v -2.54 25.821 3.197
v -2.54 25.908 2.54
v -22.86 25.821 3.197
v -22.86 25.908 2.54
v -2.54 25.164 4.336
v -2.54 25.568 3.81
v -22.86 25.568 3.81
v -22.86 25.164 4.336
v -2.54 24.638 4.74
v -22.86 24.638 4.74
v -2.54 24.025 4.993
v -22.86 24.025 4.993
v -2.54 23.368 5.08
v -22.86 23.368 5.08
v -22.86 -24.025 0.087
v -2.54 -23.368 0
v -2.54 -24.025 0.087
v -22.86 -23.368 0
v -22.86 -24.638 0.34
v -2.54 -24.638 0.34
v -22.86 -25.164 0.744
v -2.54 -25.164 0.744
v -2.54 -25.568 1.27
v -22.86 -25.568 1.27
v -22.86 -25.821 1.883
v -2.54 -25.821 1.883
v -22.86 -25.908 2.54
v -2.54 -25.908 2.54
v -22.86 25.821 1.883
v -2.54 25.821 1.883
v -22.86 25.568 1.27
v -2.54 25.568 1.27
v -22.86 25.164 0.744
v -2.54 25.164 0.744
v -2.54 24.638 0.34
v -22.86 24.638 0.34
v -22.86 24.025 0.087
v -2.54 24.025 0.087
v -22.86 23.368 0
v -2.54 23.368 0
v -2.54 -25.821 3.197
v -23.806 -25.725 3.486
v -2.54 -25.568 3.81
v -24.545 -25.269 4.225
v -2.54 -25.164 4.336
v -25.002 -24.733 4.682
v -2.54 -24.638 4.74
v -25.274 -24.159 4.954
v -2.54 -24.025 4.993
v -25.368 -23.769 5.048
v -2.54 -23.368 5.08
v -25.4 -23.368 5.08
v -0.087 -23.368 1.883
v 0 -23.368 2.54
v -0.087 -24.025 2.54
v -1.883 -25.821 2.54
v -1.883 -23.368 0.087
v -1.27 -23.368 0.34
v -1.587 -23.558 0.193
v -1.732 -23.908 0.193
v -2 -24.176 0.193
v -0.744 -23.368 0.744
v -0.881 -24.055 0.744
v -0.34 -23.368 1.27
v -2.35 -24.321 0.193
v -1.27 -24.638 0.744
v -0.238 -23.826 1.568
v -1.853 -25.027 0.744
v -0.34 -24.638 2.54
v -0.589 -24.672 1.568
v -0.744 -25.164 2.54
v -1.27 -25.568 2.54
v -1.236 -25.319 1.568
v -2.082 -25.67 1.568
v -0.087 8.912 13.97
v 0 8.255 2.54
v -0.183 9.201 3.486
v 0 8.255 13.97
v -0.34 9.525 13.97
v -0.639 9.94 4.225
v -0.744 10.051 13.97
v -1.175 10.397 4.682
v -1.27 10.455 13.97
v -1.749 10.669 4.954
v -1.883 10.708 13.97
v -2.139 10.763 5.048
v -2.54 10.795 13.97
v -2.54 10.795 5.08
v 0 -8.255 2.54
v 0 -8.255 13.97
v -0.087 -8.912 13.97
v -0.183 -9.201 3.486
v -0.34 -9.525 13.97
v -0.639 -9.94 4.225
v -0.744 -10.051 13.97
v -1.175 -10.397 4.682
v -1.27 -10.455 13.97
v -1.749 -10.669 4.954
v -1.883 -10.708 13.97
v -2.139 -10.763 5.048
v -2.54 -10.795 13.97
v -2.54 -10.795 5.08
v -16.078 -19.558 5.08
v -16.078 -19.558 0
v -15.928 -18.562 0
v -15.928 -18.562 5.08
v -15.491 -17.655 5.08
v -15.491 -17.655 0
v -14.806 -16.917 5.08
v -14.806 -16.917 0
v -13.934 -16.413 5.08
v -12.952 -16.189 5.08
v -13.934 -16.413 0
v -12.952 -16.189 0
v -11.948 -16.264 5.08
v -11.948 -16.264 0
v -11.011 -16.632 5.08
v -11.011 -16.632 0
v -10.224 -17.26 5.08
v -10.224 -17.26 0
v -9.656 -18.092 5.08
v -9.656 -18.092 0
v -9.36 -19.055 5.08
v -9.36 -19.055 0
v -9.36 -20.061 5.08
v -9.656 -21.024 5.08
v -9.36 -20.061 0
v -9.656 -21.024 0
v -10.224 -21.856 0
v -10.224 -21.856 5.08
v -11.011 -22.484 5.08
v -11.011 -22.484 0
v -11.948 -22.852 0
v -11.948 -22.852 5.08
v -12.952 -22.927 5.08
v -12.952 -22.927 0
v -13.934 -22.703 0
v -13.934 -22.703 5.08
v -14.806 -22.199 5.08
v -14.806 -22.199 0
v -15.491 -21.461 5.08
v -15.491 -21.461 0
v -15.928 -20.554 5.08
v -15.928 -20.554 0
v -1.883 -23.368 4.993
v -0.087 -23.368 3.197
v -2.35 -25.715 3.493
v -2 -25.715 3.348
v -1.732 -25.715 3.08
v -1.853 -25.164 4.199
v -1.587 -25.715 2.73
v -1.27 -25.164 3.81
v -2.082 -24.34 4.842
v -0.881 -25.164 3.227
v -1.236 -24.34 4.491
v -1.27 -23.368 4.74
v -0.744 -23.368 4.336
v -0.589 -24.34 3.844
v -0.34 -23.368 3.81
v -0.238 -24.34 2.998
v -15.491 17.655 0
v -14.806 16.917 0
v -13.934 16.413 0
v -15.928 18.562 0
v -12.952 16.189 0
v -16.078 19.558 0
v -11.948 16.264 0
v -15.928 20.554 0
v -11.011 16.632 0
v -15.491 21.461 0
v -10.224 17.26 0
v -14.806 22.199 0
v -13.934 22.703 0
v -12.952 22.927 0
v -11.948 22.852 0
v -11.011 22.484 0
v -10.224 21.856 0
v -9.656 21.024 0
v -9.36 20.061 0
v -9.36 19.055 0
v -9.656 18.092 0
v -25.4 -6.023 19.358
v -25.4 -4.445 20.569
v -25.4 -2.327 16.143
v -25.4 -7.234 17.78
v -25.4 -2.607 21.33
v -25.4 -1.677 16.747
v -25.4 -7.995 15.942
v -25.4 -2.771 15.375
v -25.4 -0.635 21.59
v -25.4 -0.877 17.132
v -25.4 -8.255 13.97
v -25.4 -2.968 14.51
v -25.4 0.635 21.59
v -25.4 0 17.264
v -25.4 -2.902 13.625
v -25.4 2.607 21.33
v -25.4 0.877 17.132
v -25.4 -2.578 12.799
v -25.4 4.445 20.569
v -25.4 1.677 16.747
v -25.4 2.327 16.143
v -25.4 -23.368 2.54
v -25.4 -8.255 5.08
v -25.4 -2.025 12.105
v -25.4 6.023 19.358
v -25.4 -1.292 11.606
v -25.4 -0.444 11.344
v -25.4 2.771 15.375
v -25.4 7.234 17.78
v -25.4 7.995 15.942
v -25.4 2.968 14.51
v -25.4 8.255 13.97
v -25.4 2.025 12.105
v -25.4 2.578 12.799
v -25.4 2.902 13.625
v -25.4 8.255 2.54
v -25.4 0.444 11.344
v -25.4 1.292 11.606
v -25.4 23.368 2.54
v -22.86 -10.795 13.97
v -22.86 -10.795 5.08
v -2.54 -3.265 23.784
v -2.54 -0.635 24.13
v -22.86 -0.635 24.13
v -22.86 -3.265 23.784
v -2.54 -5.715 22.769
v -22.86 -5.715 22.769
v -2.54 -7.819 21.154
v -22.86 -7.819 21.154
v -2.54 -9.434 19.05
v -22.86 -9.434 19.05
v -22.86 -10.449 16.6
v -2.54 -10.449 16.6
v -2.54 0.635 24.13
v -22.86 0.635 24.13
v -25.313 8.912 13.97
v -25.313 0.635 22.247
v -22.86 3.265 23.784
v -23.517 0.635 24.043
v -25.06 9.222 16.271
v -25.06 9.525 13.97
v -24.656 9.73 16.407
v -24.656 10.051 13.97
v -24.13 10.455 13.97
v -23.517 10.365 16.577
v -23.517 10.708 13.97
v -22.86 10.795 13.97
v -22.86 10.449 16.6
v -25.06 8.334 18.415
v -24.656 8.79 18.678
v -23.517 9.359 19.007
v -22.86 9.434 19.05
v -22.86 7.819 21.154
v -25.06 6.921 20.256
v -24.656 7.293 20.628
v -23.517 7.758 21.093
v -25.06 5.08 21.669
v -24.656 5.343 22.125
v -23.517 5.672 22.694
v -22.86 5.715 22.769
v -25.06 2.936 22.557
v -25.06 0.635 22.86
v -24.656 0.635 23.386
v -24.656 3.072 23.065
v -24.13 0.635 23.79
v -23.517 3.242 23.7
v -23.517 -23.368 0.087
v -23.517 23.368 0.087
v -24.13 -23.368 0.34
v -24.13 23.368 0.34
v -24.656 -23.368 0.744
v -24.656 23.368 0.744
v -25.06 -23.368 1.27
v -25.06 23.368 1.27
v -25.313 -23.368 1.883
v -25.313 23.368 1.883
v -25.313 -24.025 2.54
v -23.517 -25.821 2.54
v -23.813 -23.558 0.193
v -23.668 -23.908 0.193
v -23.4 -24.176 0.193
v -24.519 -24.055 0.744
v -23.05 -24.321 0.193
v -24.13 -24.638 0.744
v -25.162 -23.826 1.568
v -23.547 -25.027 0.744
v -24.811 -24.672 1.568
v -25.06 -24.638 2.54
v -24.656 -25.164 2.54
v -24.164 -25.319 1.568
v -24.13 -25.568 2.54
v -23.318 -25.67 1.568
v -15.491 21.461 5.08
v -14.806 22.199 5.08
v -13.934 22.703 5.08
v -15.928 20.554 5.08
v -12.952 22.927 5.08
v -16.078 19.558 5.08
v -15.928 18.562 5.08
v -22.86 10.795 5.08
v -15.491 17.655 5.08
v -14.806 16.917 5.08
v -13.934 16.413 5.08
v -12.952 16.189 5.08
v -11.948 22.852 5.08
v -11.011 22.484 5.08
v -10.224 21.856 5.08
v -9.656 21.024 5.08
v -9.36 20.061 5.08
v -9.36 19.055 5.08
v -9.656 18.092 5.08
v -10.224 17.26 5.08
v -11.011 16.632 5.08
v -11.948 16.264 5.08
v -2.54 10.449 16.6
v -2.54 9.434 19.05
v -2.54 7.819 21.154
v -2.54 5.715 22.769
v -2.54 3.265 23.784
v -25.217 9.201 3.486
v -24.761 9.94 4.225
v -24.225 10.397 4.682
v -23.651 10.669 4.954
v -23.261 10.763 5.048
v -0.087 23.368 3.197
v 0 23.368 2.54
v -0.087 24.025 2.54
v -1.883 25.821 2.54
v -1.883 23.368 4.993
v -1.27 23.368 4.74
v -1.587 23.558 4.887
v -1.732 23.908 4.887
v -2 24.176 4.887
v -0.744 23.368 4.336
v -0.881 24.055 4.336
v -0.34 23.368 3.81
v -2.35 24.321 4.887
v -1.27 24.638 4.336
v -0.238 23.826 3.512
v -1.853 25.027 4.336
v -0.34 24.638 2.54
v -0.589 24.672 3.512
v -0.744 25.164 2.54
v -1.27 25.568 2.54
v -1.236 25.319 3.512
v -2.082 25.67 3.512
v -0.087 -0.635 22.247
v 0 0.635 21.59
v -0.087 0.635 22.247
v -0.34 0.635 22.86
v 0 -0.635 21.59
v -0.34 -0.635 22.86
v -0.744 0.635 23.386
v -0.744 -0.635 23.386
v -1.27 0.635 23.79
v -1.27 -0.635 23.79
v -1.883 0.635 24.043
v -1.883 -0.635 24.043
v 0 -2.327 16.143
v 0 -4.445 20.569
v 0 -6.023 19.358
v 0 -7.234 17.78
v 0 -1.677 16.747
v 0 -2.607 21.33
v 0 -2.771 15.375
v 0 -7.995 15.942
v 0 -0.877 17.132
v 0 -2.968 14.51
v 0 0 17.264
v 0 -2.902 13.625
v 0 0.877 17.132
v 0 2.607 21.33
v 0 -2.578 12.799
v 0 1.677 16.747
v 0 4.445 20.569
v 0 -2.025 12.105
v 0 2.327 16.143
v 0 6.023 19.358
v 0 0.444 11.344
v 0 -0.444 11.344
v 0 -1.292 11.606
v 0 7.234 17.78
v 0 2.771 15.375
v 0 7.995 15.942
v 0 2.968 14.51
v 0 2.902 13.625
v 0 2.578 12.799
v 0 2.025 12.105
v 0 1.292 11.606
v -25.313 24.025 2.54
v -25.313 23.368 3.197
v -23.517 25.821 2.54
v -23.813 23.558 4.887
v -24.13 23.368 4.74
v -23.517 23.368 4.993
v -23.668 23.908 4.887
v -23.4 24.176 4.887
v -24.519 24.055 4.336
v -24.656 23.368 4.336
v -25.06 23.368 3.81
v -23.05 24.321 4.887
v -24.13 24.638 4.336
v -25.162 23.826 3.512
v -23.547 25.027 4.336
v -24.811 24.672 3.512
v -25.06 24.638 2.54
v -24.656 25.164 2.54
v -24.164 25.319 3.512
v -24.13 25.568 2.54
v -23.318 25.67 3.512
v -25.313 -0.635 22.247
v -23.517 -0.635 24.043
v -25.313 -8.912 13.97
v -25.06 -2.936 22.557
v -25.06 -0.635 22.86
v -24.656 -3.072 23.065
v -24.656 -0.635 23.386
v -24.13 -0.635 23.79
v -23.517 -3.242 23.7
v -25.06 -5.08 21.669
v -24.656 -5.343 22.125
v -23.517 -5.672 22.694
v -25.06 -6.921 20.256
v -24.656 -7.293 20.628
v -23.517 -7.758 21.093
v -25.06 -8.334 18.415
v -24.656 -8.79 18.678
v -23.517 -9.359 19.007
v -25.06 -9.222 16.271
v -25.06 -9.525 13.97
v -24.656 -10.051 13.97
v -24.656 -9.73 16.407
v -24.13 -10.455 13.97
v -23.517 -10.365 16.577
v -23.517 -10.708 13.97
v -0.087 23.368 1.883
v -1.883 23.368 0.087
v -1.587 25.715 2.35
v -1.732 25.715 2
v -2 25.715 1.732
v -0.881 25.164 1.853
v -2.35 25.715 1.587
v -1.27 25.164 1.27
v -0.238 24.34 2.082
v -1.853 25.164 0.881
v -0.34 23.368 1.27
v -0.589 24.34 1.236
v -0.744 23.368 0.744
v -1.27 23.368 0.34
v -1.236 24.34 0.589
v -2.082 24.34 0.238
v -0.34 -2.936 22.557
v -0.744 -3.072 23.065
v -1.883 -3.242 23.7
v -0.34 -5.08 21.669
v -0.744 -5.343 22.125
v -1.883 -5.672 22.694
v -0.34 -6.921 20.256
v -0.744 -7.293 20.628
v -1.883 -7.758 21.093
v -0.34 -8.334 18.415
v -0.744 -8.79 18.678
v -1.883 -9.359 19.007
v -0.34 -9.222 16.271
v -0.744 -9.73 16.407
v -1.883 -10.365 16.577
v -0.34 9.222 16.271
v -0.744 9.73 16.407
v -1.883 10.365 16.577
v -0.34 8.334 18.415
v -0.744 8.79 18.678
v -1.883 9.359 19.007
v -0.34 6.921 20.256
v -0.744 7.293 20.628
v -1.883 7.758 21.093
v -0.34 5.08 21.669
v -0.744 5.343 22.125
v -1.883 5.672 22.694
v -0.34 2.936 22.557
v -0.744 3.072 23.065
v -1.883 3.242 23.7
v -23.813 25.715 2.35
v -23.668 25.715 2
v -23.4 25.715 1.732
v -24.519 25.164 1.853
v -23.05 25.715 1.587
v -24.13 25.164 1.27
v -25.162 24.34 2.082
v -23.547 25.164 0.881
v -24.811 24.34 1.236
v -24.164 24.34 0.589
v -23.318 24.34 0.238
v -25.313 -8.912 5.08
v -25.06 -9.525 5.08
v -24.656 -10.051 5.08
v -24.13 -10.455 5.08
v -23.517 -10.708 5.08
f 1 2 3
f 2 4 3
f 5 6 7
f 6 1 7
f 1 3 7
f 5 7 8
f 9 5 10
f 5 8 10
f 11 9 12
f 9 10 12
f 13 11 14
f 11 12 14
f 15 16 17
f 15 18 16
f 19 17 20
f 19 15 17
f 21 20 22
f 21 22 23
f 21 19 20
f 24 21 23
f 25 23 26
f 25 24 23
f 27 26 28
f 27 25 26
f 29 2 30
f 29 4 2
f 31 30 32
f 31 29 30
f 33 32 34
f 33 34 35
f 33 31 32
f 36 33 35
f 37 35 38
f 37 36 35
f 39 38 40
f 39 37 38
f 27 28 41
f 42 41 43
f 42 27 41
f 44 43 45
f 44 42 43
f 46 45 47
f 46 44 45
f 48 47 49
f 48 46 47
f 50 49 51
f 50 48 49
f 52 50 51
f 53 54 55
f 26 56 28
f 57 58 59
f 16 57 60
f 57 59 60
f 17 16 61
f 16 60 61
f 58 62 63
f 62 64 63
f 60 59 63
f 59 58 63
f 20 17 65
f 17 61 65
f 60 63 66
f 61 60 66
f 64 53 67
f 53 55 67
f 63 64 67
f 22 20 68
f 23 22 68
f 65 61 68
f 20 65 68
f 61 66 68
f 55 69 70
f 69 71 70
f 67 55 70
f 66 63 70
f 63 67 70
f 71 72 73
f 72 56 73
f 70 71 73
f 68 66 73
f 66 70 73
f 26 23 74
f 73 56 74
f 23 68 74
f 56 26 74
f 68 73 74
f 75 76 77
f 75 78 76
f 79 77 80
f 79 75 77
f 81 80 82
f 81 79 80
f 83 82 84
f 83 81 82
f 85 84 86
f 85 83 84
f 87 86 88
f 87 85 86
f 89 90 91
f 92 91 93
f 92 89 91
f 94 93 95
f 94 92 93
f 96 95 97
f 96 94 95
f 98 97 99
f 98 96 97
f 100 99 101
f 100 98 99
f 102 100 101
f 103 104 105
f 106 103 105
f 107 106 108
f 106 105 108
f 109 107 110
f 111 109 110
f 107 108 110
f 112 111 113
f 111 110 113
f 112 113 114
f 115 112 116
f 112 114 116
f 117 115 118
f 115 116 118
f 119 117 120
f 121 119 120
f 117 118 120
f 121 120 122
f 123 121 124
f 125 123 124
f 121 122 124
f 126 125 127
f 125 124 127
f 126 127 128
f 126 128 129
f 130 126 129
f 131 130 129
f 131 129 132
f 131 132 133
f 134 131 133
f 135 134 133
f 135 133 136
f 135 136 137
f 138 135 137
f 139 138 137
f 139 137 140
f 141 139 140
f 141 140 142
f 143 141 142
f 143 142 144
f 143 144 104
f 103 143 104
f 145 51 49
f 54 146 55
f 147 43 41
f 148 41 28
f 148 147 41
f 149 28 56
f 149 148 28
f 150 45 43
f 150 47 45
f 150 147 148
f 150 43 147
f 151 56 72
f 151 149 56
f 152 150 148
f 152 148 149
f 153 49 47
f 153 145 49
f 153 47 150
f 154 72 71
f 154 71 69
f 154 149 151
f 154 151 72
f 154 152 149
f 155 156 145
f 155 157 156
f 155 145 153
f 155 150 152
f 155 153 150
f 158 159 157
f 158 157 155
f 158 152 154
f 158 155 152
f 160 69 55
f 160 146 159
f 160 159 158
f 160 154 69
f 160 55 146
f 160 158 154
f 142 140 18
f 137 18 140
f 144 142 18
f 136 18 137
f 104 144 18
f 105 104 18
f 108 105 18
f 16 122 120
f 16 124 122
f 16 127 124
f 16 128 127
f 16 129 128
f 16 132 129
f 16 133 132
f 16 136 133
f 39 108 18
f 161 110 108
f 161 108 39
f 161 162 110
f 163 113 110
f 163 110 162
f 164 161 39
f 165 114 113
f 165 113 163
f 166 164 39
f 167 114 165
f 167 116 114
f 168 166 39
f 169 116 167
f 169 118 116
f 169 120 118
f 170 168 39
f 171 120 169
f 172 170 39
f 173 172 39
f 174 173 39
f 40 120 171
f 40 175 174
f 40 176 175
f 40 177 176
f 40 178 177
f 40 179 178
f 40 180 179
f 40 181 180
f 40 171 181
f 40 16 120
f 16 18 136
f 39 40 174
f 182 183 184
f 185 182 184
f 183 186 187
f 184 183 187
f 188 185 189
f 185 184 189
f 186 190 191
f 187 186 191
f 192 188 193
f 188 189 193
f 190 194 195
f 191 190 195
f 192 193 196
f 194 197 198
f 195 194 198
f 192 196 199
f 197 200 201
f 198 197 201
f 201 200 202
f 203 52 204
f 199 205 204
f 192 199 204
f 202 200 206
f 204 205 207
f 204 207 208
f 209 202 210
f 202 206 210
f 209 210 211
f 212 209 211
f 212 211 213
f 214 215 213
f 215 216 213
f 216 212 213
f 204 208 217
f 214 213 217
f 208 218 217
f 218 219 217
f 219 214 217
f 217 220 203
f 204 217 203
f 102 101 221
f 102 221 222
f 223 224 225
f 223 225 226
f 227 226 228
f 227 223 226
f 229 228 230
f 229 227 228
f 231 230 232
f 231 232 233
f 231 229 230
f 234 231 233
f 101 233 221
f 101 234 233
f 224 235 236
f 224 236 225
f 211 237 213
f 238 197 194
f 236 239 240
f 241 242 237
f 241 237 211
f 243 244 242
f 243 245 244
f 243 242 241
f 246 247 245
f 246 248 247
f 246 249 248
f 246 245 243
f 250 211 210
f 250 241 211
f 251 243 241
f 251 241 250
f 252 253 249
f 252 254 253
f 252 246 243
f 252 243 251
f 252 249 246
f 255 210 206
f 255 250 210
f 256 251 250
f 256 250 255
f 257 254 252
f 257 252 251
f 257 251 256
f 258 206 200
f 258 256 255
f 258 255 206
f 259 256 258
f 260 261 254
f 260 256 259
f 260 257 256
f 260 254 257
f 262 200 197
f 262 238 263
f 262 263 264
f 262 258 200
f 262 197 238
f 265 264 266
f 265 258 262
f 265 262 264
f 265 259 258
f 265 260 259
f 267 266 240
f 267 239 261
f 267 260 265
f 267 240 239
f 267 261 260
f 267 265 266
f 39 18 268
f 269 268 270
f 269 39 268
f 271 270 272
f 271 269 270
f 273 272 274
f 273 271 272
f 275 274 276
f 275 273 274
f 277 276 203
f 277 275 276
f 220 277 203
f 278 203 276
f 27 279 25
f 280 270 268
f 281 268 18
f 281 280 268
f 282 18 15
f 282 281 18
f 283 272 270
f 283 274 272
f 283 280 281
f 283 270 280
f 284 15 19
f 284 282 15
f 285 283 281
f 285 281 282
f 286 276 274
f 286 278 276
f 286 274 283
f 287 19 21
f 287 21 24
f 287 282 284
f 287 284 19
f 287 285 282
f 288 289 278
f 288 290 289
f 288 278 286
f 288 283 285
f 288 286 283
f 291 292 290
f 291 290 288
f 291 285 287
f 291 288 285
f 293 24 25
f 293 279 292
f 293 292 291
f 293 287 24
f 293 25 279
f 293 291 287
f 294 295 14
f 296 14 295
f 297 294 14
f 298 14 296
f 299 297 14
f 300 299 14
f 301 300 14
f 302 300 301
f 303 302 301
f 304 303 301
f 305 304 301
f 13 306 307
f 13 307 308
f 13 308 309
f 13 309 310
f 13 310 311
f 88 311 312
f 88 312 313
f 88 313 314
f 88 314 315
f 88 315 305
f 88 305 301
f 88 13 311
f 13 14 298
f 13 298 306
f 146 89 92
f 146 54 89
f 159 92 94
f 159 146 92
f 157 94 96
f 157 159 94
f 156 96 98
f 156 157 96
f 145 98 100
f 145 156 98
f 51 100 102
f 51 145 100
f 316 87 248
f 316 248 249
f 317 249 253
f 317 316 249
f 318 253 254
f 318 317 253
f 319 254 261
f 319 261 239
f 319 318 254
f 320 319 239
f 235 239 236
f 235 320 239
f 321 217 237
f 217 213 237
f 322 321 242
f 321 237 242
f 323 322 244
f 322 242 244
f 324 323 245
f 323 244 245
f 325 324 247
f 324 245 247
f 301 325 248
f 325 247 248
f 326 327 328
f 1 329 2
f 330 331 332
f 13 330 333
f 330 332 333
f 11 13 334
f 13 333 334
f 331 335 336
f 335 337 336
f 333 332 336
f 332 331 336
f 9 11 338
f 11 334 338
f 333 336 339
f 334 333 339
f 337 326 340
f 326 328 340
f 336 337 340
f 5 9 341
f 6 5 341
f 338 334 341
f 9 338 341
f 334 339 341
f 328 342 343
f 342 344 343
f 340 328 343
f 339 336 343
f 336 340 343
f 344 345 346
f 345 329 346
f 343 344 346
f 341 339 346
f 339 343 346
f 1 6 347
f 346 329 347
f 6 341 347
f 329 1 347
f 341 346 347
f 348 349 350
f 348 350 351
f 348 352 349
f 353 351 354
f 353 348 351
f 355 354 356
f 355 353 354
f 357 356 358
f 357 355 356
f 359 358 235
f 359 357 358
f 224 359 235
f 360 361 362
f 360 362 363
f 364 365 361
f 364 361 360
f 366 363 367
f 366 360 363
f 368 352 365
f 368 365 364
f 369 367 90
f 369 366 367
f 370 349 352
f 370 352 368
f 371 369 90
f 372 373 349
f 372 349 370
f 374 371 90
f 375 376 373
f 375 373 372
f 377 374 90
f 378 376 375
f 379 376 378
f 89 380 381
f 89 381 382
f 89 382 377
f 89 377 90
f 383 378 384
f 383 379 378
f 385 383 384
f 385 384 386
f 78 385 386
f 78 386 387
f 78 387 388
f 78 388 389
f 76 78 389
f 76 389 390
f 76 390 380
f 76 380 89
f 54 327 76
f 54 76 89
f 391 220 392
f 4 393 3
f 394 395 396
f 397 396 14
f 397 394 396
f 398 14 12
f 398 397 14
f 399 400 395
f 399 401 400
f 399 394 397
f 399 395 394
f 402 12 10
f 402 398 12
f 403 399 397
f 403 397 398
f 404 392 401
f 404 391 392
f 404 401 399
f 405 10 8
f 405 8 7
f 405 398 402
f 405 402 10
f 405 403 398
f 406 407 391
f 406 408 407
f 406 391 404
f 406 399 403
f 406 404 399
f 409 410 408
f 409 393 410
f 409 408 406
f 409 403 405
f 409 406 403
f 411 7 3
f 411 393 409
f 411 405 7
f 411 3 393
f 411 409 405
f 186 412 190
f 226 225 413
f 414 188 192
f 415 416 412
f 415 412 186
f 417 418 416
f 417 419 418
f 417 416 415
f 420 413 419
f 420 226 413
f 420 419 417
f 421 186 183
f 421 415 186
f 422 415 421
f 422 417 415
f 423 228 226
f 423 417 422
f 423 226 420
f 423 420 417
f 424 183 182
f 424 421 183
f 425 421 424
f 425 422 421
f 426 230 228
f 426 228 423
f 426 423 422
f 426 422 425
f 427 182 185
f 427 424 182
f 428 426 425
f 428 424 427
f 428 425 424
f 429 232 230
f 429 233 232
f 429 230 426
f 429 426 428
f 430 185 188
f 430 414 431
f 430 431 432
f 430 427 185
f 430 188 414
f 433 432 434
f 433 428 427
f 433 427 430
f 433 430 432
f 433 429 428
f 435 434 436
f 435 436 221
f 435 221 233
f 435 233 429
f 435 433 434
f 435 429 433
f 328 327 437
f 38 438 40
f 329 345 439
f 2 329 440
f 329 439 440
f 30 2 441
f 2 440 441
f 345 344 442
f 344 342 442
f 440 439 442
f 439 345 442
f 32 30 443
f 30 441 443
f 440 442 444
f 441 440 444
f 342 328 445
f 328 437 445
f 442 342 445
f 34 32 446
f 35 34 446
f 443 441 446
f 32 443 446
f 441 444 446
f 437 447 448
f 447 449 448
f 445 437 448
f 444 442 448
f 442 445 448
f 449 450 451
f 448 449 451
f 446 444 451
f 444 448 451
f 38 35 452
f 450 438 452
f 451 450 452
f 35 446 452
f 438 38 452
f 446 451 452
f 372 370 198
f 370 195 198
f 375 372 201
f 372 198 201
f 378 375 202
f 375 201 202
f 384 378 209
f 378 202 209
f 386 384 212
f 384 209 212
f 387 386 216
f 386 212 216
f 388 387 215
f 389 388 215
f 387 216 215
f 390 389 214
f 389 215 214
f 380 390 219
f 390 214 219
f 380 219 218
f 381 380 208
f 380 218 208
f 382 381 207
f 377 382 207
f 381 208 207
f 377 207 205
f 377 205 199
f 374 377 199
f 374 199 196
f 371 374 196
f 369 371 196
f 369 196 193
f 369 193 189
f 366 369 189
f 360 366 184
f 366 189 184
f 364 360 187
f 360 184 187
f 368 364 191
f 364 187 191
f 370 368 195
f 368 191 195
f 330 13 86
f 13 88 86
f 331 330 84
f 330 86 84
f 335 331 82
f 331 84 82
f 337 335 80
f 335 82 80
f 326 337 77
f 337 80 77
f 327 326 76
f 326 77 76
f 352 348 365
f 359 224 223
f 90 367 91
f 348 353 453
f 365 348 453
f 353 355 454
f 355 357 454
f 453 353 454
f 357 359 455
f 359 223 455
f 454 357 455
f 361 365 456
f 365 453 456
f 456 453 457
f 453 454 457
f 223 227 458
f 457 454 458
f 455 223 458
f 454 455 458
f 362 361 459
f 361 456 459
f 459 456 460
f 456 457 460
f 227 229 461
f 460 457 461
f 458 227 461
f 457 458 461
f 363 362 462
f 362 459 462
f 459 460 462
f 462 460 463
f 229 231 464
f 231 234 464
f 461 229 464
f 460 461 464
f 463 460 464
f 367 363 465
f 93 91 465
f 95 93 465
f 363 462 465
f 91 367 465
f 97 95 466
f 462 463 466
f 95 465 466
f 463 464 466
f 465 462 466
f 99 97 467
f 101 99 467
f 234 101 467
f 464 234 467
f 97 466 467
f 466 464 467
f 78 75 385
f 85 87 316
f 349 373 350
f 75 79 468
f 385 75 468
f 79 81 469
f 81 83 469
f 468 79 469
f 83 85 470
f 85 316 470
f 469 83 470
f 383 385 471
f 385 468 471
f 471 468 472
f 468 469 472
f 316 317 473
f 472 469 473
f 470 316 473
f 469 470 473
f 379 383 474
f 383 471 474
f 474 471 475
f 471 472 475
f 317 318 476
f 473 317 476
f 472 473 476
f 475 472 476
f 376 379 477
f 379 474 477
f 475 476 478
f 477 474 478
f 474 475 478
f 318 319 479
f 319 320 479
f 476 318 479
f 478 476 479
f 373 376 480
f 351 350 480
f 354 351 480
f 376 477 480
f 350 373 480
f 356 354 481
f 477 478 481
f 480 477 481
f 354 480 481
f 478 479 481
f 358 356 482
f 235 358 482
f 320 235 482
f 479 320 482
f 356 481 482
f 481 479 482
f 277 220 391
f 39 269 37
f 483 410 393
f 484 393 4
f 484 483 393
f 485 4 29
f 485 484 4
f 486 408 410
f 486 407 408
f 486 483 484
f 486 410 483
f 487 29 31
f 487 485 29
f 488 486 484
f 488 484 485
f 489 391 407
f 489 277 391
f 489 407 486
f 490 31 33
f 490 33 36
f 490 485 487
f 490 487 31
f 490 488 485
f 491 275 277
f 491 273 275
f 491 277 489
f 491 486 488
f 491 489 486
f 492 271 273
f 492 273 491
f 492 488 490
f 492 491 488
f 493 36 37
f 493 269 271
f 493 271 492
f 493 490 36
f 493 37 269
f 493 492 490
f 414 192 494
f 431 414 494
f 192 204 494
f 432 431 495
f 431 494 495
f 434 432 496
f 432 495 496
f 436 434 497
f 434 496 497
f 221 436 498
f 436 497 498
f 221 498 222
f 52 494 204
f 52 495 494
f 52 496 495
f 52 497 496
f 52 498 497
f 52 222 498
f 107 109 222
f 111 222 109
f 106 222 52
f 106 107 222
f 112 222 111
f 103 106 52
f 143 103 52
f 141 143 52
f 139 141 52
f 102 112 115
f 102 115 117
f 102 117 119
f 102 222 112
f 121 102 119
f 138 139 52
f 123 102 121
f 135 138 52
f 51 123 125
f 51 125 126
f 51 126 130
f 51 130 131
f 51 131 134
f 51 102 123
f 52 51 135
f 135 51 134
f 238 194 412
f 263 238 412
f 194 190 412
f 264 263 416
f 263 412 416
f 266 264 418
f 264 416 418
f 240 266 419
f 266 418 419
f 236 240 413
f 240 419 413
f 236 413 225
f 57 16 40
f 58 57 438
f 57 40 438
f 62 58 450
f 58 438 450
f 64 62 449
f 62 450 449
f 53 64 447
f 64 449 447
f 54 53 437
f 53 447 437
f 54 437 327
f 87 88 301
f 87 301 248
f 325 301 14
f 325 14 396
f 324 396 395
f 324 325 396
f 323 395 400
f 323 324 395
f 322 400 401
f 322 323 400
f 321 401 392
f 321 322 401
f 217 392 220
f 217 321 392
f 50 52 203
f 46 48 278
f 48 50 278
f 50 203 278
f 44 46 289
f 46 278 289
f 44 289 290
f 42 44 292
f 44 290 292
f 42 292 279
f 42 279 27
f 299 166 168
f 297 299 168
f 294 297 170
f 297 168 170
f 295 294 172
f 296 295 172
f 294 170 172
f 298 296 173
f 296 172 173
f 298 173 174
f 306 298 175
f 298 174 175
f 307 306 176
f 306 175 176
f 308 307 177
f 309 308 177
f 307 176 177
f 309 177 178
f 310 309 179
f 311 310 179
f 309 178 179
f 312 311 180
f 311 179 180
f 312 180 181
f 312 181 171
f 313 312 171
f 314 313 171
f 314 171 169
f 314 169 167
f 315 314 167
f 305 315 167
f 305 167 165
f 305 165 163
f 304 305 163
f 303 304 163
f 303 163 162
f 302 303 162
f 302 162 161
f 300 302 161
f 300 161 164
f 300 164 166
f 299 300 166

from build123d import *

# Parameters (mm, degrees)
BOSS_EXTRUDE1_DEPTH                  = 25.4
F_15_64_0_23438_DIAMETER_HOLE1_D     = 5.953252
F_15_64_0_23438_DIAMETER_HOLE1_DEPTH = 25.4
F_15_64_0_23438_DIAMETER_HOLE1_TIP   = 1.788537341
F_1_4_CLEARANCE_HOLE1_D              = 6.7564
F_1_4_CLEARANCE_HOLE1_DEPTH          = 25.4
F_1_4_CLEARANCE_HOLE1_TIP            = 2.029827343
FILLET1_R                            = 2.54


with BuildPart() as part:
    # Sketch1 → Boss-Extrude1 (new body)
    with BuildSketch(Plane(origin=(0, 0, 0), x_dir=(0, 0, -1), z_dir=(1, 0, 0))):
        with BuildLine():
            Line((0, 0), (0, 25.908))
            Line((0, 25.908), (-5.08, 25.908))
            Line((-5.08, 25.908), (-5.08, 10.795))
            Line((-5.08, 10.795), (-13.97, 10.795))
            ThreePointArc((-13.97, 10.795), (-21.154204897, 7.819204897), (-24.13, 0.635))
            Line((-24.13, 0.635), (-24.13, -0.635))
            ThreePointArc((-24.13, -0.635), (-21.154204897, -7.819204897), (-13.97, -10.795))
            Line((-13.97, -10.795), (-5.08, -10.795))
            Line((-5.08, -10.795), (-5.08, -25.908))
            Line((-5.08, -25.908), (0, -25.908))
            Line((0, -25.908), (0, 0))
        make_face()
    extrude(amount=-BOSS_EXTRUDE1_DEPTH)

    # 15/64 (0.23438) Diameter Hole1
    with Locations(Plane(origin=(0, 0, 0), x_dir=(0, 0, -1), z_dir=(1, 0, 0))):
        with Locations((-14.2875, 0)):
            Hole(F_15_64_0_23438_DIAMETER_HOLE1_D / 2, depth=F_15_64_0_23438_DIAMETER_HOLE1_DEPTH)
            with Locations((0, 0, -(F_15_64_0_23438_DIAMETER_HOLE1_DEPTH + F_15_64_0_23438_DIAMETER_HOLE1_TIP / 2))):  # 118° drill point
                Cone(0, F_15_64_0_23438_DIAMETER_HOLE1_D / 2, F_15_64_0_23438_DIAMETER_HOLE1_TIP, mode=Mode.SUBTRACT)

    # 1/4 Clearance Hole1
    with Locations(Plane.XY.offset(5.08)):
        with Locations((-12.7, 19.558), (-12.7, -19.558)):
            Hole(F_1_4_CLEARANCE_HOLE1_D / 2, depth=F_1_4_CLEARANCE_HOLE1_DEPTH)
            with Locations((0, 0, -(F_1_4_CLEARANCE_HOLE1_DEPTH + F_1_4_CLEARANCE_HOLE1_TIP / 2))):  # 118° drill point
                Cone(0, F_1_4_CLEARANCE_HOLE1_D / 2, F_1_4_CLEARANCE_HOLE1_TIP, mode=Mode.SUBTRACT)

    # Fillet1
    fillet1_edges = [part.edges().sort_by_distance(p)[0] for p in [
        (0, -10.795, 9.525),
        (-25.4, -10.795, 9.525),
        (0, -7.819204897, 21.154204897),
        (-25.4, -7.819204897, 21.154204897),
        (0, -18.3515, 5.08),
        (-12.7, -25.908, 5.08),
        (0, 0, 24.13),
        (0, -25.908, 2.54),
        (0, 7.819204897, 21.154204897),
        (0, 0, 0),
        (0, 10.795, 9.525),
        (0, 25.908, 2.54),
        (0, 18.3515, 5.08),
        (-25.4, -25.908, 2.54),
        (-25.4, 0, 0),
        (-25.4, 25.908, 2.54),
        (-25.4, 18.3515, 5.08),
        (-25.4, 10.795, 9.525),
        (-25.4, 7.819204897, 21.154204897),
        (-25.4, 0, 24.13),
        (-12.7, -25.908, 0),
        (-12.7, 25.908, 0),
        (-12.7, 25.908, 5.08),
    ]]
    fillet(fillet1_edges, radius=FILLET1_R - 0.0001)  # a hair under: the kernel refuses the full size


solid = part.part
